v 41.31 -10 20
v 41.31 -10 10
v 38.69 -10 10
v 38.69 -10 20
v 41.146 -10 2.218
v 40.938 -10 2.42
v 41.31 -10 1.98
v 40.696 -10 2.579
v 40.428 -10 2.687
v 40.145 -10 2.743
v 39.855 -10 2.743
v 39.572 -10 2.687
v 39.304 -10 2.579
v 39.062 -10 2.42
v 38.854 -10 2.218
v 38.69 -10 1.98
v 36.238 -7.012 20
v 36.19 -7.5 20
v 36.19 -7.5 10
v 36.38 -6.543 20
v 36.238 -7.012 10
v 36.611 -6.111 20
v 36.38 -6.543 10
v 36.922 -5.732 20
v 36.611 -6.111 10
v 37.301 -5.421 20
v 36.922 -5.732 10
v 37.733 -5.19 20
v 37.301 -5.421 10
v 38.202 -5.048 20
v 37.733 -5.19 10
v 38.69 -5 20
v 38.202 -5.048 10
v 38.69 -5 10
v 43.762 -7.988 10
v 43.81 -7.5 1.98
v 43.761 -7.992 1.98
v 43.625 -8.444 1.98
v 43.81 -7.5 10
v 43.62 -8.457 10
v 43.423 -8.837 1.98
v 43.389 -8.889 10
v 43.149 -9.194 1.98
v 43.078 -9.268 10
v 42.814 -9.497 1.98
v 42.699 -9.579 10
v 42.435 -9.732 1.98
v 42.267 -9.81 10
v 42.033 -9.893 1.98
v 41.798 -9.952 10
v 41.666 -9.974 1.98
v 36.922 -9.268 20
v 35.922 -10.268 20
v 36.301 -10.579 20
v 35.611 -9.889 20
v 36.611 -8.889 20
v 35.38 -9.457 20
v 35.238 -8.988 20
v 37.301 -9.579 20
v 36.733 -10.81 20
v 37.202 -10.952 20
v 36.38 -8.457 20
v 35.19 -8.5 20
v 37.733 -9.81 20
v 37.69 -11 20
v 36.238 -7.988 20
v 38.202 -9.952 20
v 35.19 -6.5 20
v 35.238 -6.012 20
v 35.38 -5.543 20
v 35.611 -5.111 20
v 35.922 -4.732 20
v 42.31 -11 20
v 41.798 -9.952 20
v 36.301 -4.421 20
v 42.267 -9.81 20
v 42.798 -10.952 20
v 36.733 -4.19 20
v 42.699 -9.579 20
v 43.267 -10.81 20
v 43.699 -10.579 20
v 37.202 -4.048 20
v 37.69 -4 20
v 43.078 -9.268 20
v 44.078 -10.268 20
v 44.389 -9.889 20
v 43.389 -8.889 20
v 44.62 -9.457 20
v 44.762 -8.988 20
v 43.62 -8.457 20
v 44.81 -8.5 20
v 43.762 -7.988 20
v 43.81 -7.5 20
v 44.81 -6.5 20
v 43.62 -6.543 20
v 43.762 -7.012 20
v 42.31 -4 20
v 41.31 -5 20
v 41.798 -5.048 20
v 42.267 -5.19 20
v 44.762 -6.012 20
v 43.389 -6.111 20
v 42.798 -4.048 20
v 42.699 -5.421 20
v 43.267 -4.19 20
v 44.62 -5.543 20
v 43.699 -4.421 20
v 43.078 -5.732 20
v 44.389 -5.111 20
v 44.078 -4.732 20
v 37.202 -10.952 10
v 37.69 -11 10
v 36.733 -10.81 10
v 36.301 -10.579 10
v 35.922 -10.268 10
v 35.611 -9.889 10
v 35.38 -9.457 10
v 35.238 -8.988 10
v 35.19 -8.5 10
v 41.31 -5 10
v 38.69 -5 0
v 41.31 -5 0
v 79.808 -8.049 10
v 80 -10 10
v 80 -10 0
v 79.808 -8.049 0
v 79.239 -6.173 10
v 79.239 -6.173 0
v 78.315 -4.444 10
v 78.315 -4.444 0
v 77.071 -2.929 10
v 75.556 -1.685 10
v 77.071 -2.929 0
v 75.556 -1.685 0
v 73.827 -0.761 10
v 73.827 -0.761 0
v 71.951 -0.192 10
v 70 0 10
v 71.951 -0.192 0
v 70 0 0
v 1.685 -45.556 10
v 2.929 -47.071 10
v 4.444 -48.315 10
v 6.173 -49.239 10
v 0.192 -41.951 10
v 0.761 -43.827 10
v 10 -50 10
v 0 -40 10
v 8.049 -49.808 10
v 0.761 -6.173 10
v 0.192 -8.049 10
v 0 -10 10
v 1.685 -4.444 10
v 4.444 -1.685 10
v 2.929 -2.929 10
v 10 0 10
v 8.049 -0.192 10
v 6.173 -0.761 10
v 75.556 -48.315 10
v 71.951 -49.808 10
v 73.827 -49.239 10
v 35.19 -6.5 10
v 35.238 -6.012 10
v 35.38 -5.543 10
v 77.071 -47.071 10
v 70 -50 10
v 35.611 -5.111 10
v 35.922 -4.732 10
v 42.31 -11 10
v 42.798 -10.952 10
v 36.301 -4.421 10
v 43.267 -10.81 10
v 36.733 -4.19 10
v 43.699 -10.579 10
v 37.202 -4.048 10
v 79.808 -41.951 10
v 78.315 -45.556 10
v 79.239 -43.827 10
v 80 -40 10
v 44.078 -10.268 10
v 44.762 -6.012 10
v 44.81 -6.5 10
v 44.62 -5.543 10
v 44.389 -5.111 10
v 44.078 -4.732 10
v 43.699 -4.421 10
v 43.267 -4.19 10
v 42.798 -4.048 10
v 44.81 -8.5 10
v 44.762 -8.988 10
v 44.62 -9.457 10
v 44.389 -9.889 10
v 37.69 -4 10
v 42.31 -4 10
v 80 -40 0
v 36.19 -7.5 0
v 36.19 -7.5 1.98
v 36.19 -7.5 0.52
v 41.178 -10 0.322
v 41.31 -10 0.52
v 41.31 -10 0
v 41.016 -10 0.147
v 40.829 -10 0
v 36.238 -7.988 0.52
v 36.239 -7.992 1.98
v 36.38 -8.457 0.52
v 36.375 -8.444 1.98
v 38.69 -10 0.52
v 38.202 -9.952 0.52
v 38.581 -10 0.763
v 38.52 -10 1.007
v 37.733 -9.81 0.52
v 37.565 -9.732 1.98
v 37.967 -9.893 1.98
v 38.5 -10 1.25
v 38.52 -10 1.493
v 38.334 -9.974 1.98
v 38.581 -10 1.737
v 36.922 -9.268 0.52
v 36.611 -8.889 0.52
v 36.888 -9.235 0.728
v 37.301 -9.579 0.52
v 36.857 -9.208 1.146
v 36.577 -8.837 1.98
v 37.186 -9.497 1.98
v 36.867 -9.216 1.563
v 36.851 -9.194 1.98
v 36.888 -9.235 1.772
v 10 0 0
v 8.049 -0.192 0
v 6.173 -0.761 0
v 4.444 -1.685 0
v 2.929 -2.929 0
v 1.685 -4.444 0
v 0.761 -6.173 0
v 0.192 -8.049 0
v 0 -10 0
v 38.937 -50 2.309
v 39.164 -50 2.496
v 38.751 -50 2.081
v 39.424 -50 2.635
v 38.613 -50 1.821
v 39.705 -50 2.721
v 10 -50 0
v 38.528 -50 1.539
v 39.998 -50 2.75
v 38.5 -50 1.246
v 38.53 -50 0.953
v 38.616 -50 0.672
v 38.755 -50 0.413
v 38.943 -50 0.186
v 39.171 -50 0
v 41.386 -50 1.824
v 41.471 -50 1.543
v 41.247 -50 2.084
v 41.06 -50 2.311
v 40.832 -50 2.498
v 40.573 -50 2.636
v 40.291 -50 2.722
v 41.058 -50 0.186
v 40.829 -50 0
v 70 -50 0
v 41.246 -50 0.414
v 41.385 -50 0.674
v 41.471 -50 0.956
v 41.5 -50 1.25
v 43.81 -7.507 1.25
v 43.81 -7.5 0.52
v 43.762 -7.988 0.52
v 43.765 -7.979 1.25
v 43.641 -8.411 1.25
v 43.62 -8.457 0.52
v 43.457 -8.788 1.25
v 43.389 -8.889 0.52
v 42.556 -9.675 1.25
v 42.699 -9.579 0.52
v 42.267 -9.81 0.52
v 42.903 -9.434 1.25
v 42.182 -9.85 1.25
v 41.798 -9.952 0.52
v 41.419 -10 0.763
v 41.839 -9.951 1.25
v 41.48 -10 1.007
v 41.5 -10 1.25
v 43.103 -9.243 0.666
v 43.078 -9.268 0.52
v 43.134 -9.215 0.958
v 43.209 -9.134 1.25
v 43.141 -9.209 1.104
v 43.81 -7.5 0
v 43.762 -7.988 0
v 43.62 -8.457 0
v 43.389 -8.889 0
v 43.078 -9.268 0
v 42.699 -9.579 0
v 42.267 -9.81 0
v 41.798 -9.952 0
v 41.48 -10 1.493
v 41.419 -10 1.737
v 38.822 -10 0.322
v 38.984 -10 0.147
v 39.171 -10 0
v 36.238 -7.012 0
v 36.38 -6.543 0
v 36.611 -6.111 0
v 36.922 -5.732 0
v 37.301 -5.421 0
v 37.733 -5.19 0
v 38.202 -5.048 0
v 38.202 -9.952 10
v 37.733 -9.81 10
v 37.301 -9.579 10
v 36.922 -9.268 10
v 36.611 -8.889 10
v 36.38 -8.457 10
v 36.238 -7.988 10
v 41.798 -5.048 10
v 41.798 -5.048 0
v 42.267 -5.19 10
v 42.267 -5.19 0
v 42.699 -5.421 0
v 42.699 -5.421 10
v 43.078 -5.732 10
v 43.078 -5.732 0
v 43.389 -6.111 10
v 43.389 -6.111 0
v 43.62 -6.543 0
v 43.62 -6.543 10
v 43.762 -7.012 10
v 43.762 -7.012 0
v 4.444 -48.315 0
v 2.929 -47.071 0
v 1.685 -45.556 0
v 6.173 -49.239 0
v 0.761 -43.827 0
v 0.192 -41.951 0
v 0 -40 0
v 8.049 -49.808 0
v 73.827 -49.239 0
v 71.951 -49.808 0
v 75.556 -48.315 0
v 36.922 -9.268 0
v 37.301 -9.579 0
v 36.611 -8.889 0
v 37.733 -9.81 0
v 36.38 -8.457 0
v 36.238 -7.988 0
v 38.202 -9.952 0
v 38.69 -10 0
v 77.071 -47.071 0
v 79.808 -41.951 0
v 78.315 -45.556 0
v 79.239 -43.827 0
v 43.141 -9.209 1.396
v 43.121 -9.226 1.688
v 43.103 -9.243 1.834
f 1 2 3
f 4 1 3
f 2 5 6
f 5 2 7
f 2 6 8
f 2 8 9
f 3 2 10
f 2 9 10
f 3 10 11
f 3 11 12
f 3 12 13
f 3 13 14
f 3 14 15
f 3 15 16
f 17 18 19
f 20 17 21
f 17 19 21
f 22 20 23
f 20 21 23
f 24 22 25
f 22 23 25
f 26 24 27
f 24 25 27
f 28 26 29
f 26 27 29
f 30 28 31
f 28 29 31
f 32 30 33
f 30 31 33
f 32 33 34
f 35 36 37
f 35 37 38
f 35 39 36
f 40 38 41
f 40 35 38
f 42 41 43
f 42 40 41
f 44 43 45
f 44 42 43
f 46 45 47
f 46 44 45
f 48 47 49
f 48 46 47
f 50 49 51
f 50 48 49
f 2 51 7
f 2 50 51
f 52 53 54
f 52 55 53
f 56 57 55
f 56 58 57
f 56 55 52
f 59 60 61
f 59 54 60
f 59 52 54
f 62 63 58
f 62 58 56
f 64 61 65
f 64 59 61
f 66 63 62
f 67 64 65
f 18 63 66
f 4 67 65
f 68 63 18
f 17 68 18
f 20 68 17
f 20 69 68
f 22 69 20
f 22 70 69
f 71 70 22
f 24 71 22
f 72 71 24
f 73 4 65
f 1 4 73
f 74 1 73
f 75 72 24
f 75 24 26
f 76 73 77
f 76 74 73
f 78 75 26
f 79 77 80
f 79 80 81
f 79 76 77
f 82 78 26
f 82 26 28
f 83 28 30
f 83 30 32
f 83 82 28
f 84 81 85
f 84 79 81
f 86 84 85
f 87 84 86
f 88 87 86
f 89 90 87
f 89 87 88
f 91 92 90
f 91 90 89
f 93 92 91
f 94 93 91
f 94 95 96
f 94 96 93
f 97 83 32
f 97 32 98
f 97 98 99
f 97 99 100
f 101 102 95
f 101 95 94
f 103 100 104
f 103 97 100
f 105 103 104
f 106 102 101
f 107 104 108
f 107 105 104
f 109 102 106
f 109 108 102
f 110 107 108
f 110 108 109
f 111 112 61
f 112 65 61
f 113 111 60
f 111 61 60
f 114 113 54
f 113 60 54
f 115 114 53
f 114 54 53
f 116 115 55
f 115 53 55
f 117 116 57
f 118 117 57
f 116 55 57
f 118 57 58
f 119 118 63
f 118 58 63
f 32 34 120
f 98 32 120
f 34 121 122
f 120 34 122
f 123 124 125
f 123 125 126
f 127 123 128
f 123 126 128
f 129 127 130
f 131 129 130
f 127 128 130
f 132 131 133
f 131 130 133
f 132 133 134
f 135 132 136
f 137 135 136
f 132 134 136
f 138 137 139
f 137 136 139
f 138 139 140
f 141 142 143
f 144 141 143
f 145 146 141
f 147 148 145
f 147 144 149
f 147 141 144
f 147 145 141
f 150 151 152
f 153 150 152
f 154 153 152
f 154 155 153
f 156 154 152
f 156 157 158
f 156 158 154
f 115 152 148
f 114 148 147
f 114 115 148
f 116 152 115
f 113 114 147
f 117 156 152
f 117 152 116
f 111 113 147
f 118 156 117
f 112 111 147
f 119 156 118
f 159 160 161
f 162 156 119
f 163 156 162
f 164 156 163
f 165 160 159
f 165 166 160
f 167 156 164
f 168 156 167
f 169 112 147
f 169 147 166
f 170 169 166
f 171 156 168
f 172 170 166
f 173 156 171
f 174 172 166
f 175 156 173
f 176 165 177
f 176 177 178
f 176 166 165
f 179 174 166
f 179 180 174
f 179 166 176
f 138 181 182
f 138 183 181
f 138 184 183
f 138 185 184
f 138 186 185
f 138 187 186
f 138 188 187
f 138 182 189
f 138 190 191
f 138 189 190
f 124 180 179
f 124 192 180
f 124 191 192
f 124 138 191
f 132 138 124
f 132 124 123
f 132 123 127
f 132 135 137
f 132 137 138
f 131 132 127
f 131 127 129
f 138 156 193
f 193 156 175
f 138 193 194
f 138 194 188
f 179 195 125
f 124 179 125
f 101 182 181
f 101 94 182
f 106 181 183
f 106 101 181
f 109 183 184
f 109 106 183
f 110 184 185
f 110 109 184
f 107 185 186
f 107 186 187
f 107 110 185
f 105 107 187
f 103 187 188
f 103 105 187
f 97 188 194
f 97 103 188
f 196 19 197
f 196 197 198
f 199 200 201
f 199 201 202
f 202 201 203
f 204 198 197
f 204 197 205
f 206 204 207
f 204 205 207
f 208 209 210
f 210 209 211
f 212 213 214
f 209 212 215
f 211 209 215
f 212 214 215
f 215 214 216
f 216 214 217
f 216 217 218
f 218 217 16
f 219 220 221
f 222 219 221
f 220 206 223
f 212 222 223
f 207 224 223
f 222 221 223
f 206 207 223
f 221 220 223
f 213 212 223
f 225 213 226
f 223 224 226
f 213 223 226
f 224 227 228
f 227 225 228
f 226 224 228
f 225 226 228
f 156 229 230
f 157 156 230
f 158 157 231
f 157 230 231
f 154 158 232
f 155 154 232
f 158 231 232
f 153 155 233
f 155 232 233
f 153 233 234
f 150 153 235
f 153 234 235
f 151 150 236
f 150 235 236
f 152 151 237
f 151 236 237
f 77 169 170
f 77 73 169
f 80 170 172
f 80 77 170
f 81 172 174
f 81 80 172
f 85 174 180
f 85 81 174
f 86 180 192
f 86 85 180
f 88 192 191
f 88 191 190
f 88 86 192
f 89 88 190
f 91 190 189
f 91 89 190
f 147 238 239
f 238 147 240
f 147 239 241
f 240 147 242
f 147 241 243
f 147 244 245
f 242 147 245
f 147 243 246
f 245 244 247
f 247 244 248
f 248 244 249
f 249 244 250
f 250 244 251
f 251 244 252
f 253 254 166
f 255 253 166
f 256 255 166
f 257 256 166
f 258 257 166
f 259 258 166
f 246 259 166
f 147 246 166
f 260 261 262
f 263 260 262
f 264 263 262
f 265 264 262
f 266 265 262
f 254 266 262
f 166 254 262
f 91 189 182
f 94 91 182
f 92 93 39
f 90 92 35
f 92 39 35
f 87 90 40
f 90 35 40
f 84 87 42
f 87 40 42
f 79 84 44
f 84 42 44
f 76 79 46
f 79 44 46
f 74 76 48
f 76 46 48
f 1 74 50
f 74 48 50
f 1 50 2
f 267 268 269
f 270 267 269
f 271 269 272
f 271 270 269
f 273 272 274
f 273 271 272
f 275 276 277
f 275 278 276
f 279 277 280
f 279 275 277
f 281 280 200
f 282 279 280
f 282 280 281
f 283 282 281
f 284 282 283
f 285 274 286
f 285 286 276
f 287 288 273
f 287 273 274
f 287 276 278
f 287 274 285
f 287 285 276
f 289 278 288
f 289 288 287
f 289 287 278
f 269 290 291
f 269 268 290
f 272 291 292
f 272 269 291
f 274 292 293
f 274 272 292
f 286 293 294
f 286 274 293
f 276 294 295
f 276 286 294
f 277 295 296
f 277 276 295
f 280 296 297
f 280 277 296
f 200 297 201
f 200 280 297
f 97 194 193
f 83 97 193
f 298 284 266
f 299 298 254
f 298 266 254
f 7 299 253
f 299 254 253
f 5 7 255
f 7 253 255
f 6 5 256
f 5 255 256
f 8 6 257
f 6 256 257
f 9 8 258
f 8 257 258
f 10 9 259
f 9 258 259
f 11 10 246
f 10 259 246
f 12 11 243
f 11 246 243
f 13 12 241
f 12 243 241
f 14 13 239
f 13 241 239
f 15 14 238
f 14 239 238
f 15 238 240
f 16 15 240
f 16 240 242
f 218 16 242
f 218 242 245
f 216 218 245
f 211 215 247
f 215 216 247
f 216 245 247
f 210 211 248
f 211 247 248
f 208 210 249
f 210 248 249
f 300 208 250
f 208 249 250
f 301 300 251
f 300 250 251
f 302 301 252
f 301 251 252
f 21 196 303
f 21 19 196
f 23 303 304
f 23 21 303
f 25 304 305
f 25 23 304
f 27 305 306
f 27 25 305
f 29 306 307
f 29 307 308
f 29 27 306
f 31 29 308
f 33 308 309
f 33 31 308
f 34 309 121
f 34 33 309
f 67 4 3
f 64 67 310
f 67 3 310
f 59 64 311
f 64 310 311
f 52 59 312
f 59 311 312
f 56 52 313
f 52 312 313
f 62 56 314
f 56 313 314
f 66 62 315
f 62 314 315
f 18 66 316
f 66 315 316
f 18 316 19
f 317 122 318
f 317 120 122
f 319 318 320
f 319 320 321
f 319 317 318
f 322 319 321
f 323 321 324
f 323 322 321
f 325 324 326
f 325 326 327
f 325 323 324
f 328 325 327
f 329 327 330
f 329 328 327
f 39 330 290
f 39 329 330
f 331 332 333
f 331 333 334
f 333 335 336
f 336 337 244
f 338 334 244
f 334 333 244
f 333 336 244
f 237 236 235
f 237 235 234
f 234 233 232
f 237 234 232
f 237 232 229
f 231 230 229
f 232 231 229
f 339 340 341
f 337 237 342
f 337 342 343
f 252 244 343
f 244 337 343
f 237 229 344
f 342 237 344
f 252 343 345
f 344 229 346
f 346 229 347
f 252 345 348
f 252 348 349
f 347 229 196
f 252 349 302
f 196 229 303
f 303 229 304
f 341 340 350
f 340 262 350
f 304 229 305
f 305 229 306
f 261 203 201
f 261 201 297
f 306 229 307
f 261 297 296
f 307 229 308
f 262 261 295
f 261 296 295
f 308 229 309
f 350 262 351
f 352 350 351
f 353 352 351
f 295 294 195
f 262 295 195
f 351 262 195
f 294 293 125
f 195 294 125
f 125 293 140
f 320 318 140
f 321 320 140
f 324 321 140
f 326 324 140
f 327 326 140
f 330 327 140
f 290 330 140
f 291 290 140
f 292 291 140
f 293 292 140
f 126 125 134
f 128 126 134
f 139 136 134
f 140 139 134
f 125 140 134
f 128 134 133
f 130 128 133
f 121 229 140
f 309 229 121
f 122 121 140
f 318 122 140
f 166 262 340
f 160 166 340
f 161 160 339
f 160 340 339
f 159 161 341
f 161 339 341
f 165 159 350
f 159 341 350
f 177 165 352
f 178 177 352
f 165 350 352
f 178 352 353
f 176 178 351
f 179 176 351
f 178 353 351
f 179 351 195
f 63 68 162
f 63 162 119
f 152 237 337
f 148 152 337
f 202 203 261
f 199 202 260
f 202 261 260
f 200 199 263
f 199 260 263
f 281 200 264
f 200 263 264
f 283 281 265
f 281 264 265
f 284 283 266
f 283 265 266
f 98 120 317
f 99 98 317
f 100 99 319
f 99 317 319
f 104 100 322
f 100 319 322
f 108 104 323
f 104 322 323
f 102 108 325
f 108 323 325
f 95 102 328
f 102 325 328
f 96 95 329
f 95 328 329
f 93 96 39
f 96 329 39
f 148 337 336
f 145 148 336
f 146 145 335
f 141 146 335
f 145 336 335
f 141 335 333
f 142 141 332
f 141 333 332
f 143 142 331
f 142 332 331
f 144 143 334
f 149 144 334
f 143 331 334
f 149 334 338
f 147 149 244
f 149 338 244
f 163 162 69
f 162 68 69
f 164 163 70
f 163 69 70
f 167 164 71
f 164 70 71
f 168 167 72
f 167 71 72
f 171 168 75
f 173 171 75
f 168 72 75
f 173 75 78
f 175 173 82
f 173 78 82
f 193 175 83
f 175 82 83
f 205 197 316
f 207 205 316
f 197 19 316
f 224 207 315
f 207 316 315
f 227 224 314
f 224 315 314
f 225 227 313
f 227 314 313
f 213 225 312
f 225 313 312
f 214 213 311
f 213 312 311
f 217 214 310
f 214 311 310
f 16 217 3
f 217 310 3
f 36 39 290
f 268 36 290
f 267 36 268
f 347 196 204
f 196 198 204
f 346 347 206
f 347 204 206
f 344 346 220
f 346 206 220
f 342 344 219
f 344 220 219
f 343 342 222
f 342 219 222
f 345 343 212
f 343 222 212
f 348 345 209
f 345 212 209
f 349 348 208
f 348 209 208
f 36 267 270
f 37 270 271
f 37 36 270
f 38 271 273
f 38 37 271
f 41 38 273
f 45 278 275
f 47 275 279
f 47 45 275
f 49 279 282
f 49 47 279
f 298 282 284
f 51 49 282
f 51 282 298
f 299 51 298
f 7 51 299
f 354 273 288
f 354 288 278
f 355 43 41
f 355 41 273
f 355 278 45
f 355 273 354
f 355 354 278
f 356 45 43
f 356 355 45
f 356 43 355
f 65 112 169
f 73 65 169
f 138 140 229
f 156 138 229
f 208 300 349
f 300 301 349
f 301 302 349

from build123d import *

# Parameters (mm, degrees)
F1_DEPTH = 10
F3_DEPTH = 45
F4_W     = 2.981
F4_H     = 5
F4_W_2   = 1.6583123952
F5_DEPTH = 25
F6_R     = 2.49999
F8_DEPTH = 10
F9_R     = 2.5


# Not quite as in the source:
# - a fillet or chamfer is up to 0.001 mm smaller than in the source, because OpenCascade refuses the exact size
# - ends of sketch curves that miss each other by under 0.0002 mm in the source are joined


with BuildPart() as f1:
    # F0 (on Top) → F1 (new body)
    with BuildSketch(Plane.XY):
        with BuildLine():
            Line((70, 0), (10, 0))
            ThreePointArc((10, 0), (2.9289321881, -2.9289321881), (0, -10))
            Line((0, -10), (0, -40))
            ThreePointArc((0, -40), (2.9289321881, -47.0710678119), (10, -50))
            Line((10, -50), (70, -50))
            ThreePointArc((70, -50), (77.0710678119, -47.0710678119), (80, -40))
            Line((80, -40), (80, -10))
            ThreePointArc((80, -10), (77.0710678119, -2.9289321881), (70, 0))
        make_face()
    extrude(amount=F1_DEPTH)

    # F2 (on face) → F3 (cut)
    with BuildSketch(Plane.XZ.offset(50)):
        with BuildLine():
            ThreePointArc((40.8291561976, 0), (41.3216910184, 0.5406814173), (41.5, 1.25))
            ThreePointArc((41.5, 1.25), (39.2906814173, 2.5716910184), (39.1708438024, 0))
            Line((39.1708438024, 0), (40.8291561976, 0))
        make_face()
    extrude(amount=-F3_DEPTH, mode=Mode.SUBTRACT)

    # F4 (on face) → F5 (cut)
    with BuildSketch(Plane(origin=(0, 0, 0), x_dir=(1, 0, 0), z_dir=(0, 0, -1))):
        with Locations((37.6803438024, 7.5)):
            Rectangle(F4_W, F4_H)
        with Locations((40, 7.5)):
            Rectangle(F4_W_2, F4_H)
        with Locations((42.3196561976, 7.5)):
            Rectangle(F4_W, F4_H)
    extrude(amount=-F5_DEPTH, mode=Mode.SUBTRACT)

    # F6 (radius 2.5 in the source; OpenCascade refuses exactly that, so slightly less here)
    f6_edges = [f1.edges().sort_by_distance(p)[0] for p in [
        (36.189844, -5, 5),
        (43.810156, -5, 5),
        (43.810156, -10, 5),
        (36.189844, -10, 5),
    ]]
    fillet(f6_edges, radius=F6_R)

    # F7 (on face) → F8 (join)
    with BuildSketch(Plane.XY.offset(10)):
        Polygon((35.1898438024, -11), (40, -11), (44.8101561976, -11), (44.8101561976, -4), (35.1898438024, -4), align=None)
        with BuildLine():
            ThreePointArc((38.6898338024, -10), (36.9220739205, -9.2677698819), (36.1898438024, -7.50001))
            ThreePointArc((36.1898438024, -7.50001), (36.9220739205, -5.7322301181), (38.6898338024, -5))
            Line((38.6898338024, -5), (41.3101661976, -5))
            ThreePointArc((41.3101661976, -5), (43.0779260795, -5.7322301181), (43.8101561976, -7.49999))
            ThreePointArc((43.8101561976, -7.49999), (43.0779260795, -9.2677698819), (41.3101661976, -10))
            Line((41.3101661976, -10), (38.6898338024, -10))
        make_face(mode=Mode.SUBTRACT)
    extrude(amount=F8_DEPTH)

    # F9
    f9_edges = [f1.edges().sort_by_distance(p)[0] for p in [
        (44.810156, -4, 15),
        (35.189844, -4, 15),
        (35.189844, -11, 15),
        (44.810156, -11, 15),
    ]]
    fillet(f9_edges, radius=F9_R)


solid = f1.part
